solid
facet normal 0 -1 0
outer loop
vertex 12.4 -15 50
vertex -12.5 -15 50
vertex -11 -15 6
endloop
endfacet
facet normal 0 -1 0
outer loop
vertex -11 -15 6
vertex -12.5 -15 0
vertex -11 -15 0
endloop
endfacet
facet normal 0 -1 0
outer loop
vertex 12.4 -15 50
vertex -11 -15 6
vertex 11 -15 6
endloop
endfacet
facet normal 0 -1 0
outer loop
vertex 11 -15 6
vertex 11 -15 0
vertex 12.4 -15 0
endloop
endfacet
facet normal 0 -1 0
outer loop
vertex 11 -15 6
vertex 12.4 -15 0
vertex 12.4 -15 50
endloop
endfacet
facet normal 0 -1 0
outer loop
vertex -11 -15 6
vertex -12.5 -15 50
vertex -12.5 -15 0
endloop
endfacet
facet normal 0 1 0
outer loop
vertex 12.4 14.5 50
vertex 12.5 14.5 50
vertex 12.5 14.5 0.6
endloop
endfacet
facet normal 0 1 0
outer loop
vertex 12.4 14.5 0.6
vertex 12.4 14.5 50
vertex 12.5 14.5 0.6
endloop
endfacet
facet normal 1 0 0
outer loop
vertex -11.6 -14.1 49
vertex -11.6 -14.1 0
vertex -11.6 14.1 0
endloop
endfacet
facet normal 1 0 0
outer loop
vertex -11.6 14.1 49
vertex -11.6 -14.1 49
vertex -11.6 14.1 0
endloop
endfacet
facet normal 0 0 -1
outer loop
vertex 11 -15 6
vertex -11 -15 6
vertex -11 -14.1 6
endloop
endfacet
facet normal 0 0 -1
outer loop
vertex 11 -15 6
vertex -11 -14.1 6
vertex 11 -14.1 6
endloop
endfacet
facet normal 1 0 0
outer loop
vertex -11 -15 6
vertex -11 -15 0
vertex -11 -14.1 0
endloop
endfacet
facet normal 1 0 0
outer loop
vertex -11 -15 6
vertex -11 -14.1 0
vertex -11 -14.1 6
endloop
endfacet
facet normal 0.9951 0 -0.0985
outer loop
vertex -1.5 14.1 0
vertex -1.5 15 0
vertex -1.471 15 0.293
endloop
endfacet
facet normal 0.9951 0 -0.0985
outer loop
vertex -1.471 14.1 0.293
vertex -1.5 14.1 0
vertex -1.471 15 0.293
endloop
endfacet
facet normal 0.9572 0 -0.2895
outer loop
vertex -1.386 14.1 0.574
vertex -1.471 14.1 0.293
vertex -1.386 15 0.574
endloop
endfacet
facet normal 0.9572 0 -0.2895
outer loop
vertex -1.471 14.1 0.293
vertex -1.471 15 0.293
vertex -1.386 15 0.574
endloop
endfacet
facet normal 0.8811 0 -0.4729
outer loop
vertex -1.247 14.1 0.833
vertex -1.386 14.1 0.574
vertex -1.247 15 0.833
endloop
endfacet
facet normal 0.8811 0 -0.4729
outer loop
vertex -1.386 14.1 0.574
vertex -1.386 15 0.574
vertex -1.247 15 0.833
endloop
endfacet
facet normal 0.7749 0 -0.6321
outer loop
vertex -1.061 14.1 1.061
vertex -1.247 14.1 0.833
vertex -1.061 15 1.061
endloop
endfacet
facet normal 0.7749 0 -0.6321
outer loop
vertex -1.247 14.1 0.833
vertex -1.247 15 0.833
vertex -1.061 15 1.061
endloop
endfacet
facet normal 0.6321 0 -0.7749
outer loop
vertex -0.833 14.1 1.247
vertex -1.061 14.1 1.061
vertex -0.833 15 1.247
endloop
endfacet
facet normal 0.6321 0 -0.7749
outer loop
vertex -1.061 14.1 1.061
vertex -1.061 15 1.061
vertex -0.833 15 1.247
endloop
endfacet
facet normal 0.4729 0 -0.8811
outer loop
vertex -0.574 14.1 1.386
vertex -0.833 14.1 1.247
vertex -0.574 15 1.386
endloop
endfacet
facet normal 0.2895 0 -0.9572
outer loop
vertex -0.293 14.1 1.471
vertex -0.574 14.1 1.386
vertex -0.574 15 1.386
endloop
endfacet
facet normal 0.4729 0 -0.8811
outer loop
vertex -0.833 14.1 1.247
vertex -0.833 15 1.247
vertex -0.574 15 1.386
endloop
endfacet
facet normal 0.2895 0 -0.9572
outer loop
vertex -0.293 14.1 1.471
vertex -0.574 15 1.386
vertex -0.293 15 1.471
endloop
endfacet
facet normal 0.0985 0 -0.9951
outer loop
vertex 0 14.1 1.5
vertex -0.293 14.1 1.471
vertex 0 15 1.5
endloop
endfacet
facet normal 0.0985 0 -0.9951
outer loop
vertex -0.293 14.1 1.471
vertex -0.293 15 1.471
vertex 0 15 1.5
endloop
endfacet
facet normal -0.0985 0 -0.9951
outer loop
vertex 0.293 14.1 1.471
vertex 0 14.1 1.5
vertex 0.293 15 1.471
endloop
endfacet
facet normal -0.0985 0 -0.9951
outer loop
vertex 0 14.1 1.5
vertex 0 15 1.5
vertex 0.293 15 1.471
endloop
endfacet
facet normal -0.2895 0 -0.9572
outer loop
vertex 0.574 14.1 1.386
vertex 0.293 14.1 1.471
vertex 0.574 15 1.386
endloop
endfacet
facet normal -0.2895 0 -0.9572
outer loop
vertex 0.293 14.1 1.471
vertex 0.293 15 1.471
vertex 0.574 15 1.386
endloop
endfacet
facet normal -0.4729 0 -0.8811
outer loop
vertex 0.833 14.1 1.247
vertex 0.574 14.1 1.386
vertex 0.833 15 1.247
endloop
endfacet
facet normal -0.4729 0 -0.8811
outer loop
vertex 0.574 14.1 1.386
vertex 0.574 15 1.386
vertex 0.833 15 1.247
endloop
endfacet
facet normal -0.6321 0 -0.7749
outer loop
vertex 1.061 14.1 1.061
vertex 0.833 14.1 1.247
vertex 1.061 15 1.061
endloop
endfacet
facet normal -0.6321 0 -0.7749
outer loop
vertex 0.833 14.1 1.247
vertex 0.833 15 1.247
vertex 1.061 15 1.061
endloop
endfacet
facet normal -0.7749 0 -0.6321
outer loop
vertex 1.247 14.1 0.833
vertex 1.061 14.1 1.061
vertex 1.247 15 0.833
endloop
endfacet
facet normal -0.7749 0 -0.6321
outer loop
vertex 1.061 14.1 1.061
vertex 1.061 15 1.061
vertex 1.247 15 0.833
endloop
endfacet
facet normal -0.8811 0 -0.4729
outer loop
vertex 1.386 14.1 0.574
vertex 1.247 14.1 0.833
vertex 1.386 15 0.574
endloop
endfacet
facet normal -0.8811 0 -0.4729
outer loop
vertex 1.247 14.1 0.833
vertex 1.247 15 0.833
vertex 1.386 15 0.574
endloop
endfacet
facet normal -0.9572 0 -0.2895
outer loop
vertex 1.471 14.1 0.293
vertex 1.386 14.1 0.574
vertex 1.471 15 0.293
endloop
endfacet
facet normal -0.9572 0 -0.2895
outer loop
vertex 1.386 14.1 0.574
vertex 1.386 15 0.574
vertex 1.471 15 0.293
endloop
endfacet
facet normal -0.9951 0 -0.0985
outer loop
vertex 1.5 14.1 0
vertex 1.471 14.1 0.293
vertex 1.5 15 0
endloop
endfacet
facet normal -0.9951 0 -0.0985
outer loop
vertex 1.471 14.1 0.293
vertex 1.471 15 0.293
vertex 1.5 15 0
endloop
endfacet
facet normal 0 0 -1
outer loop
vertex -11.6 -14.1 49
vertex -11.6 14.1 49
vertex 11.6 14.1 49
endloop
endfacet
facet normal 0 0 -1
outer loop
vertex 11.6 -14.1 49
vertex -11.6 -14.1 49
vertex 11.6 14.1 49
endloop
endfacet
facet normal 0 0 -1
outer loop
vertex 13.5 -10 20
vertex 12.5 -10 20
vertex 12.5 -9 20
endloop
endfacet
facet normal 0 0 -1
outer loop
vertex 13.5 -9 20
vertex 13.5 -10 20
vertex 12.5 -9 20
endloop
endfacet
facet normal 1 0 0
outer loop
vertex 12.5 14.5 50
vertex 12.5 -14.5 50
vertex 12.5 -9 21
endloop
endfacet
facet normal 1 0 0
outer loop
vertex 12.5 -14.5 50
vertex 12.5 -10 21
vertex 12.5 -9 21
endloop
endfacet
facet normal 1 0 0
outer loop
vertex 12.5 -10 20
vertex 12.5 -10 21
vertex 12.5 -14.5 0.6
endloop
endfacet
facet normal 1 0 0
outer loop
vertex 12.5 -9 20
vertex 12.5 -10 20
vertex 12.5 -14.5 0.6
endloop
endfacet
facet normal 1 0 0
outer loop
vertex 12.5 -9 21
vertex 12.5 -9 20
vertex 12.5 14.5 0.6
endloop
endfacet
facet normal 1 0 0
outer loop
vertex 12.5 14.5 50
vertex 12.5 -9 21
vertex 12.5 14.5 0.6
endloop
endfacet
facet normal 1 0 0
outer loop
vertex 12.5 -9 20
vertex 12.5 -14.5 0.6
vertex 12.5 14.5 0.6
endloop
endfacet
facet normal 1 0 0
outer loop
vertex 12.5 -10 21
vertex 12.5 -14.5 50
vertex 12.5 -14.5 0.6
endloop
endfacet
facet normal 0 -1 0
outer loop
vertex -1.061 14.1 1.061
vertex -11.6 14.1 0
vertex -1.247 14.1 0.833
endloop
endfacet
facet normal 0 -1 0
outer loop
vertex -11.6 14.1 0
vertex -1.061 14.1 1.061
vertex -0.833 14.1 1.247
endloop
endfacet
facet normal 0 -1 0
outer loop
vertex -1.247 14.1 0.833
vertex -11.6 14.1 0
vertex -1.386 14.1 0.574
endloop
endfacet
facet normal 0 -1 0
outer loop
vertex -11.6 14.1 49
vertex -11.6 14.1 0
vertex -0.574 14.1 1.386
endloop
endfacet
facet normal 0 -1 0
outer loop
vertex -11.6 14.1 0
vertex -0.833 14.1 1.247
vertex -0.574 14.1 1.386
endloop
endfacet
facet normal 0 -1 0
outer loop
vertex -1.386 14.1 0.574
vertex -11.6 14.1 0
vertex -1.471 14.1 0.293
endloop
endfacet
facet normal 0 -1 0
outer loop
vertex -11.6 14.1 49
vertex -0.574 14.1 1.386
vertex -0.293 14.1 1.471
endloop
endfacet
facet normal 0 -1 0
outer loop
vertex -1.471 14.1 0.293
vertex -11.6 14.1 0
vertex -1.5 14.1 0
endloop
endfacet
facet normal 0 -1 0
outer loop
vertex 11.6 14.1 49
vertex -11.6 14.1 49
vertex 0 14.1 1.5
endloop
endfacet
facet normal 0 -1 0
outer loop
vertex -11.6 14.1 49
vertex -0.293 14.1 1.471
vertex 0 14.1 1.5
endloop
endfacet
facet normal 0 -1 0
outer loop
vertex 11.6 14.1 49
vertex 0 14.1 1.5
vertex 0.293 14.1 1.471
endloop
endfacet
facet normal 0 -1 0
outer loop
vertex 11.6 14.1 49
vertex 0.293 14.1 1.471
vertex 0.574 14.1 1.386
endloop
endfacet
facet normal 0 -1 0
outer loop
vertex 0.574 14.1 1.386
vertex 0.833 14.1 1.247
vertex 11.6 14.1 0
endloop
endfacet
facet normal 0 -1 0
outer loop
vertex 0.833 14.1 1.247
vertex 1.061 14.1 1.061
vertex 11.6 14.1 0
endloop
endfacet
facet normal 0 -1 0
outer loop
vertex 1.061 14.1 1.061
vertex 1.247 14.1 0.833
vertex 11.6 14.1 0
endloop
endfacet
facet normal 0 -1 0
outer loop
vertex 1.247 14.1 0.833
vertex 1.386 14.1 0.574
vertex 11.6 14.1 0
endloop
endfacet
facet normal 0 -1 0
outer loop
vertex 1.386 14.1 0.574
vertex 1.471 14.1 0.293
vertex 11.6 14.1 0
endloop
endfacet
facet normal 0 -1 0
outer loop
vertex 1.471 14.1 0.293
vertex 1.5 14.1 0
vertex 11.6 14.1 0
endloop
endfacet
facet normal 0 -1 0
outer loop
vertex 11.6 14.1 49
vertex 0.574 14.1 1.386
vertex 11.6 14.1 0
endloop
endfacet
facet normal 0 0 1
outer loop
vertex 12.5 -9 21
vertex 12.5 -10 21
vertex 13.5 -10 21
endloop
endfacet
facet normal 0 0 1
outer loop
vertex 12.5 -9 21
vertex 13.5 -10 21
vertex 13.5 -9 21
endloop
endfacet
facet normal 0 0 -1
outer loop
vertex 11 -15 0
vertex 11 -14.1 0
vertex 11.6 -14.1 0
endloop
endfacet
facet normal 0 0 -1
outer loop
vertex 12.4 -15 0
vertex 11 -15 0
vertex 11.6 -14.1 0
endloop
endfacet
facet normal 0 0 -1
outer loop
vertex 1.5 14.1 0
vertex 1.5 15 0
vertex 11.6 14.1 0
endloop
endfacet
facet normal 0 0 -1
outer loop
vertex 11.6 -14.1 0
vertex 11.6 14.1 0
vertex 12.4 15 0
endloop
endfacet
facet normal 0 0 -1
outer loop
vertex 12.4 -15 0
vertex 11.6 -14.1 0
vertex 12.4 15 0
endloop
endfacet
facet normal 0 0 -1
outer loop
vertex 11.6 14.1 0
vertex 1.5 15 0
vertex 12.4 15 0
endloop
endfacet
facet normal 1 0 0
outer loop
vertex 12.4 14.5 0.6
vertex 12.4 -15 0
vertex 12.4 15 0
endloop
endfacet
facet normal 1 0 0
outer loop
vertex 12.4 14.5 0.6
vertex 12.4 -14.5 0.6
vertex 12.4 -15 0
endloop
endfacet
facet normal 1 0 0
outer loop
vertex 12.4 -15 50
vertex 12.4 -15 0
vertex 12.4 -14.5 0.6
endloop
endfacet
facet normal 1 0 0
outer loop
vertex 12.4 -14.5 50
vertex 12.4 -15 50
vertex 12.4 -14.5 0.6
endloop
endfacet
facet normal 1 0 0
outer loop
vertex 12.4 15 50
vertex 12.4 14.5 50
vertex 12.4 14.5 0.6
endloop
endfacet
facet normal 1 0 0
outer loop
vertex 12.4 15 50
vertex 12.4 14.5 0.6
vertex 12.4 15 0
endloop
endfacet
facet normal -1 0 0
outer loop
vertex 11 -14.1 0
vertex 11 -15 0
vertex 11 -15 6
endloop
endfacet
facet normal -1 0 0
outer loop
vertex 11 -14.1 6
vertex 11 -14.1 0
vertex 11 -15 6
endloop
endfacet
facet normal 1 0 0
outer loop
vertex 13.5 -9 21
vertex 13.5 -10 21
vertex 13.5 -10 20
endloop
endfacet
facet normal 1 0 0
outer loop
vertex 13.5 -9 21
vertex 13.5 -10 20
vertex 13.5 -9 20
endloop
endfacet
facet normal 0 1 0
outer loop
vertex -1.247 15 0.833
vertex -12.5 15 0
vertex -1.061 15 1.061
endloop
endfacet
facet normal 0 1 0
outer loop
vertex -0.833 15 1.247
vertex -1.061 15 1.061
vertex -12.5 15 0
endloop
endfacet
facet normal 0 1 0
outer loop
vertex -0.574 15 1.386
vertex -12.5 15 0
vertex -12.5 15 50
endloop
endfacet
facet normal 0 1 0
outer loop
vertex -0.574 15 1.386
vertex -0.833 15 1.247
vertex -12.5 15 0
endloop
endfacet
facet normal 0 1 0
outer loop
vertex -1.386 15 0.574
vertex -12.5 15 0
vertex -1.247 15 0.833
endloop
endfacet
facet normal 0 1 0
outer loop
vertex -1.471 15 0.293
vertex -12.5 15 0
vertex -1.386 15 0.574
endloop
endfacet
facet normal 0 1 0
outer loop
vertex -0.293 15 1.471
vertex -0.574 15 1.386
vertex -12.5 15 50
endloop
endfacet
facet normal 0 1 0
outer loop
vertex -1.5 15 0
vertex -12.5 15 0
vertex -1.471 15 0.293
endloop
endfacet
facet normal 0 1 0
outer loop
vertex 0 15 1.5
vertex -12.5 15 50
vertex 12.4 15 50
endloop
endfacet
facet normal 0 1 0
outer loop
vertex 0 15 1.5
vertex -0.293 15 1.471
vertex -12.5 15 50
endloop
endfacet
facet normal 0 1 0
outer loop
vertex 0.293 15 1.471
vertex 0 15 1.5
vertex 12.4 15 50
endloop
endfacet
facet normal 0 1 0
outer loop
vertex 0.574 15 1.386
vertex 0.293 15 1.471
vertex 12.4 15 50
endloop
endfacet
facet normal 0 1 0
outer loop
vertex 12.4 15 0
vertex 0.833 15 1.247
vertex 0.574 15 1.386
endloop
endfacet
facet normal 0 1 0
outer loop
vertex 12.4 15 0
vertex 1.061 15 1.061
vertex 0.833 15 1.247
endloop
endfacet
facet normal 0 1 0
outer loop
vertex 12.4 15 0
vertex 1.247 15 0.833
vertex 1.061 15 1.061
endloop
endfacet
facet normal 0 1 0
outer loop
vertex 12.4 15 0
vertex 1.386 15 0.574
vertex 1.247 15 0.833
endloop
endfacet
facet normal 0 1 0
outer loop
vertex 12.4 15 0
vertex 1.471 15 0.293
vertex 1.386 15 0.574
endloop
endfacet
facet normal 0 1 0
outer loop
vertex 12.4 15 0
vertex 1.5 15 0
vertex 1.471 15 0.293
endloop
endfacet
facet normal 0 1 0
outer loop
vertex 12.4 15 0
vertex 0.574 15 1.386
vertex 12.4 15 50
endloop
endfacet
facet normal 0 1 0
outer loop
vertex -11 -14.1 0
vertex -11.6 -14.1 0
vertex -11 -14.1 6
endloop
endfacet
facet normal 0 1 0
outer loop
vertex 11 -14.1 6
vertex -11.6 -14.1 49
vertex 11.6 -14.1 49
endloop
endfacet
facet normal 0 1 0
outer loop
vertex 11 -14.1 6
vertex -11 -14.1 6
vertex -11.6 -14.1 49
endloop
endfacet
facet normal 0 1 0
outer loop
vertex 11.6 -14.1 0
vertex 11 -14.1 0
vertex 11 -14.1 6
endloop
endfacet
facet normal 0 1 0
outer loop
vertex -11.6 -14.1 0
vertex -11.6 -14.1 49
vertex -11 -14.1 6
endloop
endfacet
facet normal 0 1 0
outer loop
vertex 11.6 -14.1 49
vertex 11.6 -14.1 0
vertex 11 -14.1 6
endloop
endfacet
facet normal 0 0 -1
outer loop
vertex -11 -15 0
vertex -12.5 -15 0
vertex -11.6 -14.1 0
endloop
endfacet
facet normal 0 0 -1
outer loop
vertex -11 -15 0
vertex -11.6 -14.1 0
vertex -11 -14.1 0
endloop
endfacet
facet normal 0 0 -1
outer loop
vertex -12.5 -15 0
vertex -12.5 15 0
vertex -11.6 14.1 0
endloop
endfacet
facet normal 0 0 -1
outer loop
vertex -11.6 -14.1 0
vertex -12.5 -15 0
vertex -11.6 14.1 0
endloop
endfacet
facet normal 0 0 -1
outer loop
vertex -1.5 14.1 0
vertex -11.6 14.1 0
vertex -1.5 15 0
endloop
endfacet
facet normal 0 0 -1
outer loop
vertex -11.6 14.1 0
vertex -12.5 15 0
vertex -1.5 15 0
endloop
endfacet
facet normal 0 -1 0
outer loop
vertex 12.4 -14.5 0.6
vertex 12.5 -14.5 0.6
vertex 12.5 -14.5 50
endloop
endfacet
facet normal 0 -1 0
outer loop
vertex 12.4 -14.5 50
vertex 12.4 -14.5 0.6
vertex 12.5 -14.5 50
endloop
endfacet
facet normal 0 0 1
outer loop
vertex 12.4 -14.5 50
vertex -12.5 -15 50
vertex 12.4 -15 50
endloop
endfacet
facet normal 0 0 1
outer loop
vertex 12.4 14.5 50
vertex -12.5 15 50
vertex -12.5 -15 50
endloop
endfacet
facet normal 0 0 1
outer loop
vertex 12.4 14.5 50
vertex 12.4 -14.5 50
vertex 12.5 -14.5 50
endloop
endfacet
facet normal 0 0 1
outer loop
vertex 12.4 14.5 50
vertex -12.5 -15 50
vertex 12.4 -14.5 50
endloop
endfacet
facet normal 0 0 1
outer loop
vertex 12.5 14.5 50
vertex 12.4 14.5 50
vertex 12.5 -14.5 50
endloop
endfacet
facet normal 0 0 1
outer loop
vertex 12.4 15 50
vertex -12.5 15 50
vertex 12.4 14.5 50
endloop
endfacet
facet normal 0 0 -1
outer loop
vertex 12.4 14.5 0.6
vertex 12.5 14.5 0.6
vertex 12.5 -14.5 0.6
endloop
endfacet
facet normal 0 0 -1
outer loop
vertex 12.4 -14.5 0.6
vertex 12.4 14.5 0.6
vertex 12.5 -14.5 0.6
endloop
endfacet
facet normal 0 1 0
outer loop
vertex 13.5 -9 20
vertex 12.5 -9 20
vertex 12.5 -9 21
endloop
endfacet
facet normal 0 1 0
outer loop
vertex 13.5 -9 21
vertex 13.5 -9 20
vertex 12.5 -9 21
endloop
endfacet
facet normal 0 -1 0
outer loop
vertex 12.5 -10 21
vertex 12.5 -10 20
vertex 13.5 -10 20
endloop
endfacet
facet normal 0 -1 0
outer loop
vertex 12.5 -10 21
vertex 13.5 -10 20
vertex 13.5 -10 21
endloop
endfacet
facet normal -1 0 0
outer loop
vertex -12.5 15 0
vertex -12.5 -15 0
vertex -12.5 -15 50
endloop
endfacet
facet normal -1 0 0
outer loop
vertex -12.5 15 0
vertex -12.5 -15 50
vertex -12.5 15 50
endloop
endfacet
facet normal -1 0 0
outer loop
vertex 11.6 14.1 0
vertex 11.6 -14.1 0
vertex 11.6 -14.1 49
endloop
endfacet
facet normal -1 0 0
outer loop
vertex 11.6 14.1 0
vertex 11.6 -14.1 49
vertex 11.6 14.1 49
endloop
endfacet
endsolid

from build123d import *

# Parameters (mm, degrees)
F0_W      = 25
F0_H      = 30
F0_W_2    = 23.2
F0_H_2    = 28.2
F1_DEPTH  = 50
F2_W      = 25
F2_H      = 30
F3_DEPTH  = 1
F4_W      = 1
F4_H      = 1
F5_DEPTH  = 1
F6_W      = 22
F6_H      = 6
F7_DEPTH  = 10
F8_R      = 1.5
F9_DEPTH  = 5
F11_DEPTH = 0.1


with BuildPart() as f1:
    # F0 (on Top) → F1 (new body)
    with BuildSketch(Plane.XY):
        Rectangle(F0_W, F0_H)
        Rectangle(F0_W_2, F0_H_2, mode=Mode.SUBTRACT)
    extrude(amount=F1_DEPTH)

    # F2 (on face) → F3 (join)
    with BuildSketch(Plane.XY.offset(50)):
        Rectangle(F2_W, F2_H)
    extrude(amount=-F3_DEPTH)

    # F4 (on face) → F5 (join)
    with BuildSketch(Plane.YZ.offset(12.5)):
        with Locations((-9.5, 20.5)):
            Rectangle(F4_W, F4_H)
    extrude(amount=F5_DEPTH)

    # F6 (on face) → F7 (cut)
    with BuildSketch(Plane.XZ.offset(15)):
        with Locations((0, 3)):
            Rectangle(F6_W, F6_H)
    extrude(amount=-F7_DEPTH, mode=Mode.SUBTRACT)

    # F8 (on face) → F9 (cut)
    with BuildSketch(Plane(origin=(0, 15, 0), x_dir=(-1, 0, 0), z_dir=(0, 1, 0))):
        Circle(F8_R)
    extrude(amount=-F9_DEPTH, mode=Mode.SUBTRACT)

    # F10 (on face) → F11 (cut)
    with BuildSketch(Plane.YZ.offset(12.5)):
        Polygon((14.5, 0.6), (-14.5, 0.6), (-14.5, 50), (-15, 50), (-15, 0), (15, 0), (15, 50), (14.5, 50), align=None)
    extrude(amount=-F11_DEPTH, mode=Mode.SUBTRACT)


solid = f1.part
